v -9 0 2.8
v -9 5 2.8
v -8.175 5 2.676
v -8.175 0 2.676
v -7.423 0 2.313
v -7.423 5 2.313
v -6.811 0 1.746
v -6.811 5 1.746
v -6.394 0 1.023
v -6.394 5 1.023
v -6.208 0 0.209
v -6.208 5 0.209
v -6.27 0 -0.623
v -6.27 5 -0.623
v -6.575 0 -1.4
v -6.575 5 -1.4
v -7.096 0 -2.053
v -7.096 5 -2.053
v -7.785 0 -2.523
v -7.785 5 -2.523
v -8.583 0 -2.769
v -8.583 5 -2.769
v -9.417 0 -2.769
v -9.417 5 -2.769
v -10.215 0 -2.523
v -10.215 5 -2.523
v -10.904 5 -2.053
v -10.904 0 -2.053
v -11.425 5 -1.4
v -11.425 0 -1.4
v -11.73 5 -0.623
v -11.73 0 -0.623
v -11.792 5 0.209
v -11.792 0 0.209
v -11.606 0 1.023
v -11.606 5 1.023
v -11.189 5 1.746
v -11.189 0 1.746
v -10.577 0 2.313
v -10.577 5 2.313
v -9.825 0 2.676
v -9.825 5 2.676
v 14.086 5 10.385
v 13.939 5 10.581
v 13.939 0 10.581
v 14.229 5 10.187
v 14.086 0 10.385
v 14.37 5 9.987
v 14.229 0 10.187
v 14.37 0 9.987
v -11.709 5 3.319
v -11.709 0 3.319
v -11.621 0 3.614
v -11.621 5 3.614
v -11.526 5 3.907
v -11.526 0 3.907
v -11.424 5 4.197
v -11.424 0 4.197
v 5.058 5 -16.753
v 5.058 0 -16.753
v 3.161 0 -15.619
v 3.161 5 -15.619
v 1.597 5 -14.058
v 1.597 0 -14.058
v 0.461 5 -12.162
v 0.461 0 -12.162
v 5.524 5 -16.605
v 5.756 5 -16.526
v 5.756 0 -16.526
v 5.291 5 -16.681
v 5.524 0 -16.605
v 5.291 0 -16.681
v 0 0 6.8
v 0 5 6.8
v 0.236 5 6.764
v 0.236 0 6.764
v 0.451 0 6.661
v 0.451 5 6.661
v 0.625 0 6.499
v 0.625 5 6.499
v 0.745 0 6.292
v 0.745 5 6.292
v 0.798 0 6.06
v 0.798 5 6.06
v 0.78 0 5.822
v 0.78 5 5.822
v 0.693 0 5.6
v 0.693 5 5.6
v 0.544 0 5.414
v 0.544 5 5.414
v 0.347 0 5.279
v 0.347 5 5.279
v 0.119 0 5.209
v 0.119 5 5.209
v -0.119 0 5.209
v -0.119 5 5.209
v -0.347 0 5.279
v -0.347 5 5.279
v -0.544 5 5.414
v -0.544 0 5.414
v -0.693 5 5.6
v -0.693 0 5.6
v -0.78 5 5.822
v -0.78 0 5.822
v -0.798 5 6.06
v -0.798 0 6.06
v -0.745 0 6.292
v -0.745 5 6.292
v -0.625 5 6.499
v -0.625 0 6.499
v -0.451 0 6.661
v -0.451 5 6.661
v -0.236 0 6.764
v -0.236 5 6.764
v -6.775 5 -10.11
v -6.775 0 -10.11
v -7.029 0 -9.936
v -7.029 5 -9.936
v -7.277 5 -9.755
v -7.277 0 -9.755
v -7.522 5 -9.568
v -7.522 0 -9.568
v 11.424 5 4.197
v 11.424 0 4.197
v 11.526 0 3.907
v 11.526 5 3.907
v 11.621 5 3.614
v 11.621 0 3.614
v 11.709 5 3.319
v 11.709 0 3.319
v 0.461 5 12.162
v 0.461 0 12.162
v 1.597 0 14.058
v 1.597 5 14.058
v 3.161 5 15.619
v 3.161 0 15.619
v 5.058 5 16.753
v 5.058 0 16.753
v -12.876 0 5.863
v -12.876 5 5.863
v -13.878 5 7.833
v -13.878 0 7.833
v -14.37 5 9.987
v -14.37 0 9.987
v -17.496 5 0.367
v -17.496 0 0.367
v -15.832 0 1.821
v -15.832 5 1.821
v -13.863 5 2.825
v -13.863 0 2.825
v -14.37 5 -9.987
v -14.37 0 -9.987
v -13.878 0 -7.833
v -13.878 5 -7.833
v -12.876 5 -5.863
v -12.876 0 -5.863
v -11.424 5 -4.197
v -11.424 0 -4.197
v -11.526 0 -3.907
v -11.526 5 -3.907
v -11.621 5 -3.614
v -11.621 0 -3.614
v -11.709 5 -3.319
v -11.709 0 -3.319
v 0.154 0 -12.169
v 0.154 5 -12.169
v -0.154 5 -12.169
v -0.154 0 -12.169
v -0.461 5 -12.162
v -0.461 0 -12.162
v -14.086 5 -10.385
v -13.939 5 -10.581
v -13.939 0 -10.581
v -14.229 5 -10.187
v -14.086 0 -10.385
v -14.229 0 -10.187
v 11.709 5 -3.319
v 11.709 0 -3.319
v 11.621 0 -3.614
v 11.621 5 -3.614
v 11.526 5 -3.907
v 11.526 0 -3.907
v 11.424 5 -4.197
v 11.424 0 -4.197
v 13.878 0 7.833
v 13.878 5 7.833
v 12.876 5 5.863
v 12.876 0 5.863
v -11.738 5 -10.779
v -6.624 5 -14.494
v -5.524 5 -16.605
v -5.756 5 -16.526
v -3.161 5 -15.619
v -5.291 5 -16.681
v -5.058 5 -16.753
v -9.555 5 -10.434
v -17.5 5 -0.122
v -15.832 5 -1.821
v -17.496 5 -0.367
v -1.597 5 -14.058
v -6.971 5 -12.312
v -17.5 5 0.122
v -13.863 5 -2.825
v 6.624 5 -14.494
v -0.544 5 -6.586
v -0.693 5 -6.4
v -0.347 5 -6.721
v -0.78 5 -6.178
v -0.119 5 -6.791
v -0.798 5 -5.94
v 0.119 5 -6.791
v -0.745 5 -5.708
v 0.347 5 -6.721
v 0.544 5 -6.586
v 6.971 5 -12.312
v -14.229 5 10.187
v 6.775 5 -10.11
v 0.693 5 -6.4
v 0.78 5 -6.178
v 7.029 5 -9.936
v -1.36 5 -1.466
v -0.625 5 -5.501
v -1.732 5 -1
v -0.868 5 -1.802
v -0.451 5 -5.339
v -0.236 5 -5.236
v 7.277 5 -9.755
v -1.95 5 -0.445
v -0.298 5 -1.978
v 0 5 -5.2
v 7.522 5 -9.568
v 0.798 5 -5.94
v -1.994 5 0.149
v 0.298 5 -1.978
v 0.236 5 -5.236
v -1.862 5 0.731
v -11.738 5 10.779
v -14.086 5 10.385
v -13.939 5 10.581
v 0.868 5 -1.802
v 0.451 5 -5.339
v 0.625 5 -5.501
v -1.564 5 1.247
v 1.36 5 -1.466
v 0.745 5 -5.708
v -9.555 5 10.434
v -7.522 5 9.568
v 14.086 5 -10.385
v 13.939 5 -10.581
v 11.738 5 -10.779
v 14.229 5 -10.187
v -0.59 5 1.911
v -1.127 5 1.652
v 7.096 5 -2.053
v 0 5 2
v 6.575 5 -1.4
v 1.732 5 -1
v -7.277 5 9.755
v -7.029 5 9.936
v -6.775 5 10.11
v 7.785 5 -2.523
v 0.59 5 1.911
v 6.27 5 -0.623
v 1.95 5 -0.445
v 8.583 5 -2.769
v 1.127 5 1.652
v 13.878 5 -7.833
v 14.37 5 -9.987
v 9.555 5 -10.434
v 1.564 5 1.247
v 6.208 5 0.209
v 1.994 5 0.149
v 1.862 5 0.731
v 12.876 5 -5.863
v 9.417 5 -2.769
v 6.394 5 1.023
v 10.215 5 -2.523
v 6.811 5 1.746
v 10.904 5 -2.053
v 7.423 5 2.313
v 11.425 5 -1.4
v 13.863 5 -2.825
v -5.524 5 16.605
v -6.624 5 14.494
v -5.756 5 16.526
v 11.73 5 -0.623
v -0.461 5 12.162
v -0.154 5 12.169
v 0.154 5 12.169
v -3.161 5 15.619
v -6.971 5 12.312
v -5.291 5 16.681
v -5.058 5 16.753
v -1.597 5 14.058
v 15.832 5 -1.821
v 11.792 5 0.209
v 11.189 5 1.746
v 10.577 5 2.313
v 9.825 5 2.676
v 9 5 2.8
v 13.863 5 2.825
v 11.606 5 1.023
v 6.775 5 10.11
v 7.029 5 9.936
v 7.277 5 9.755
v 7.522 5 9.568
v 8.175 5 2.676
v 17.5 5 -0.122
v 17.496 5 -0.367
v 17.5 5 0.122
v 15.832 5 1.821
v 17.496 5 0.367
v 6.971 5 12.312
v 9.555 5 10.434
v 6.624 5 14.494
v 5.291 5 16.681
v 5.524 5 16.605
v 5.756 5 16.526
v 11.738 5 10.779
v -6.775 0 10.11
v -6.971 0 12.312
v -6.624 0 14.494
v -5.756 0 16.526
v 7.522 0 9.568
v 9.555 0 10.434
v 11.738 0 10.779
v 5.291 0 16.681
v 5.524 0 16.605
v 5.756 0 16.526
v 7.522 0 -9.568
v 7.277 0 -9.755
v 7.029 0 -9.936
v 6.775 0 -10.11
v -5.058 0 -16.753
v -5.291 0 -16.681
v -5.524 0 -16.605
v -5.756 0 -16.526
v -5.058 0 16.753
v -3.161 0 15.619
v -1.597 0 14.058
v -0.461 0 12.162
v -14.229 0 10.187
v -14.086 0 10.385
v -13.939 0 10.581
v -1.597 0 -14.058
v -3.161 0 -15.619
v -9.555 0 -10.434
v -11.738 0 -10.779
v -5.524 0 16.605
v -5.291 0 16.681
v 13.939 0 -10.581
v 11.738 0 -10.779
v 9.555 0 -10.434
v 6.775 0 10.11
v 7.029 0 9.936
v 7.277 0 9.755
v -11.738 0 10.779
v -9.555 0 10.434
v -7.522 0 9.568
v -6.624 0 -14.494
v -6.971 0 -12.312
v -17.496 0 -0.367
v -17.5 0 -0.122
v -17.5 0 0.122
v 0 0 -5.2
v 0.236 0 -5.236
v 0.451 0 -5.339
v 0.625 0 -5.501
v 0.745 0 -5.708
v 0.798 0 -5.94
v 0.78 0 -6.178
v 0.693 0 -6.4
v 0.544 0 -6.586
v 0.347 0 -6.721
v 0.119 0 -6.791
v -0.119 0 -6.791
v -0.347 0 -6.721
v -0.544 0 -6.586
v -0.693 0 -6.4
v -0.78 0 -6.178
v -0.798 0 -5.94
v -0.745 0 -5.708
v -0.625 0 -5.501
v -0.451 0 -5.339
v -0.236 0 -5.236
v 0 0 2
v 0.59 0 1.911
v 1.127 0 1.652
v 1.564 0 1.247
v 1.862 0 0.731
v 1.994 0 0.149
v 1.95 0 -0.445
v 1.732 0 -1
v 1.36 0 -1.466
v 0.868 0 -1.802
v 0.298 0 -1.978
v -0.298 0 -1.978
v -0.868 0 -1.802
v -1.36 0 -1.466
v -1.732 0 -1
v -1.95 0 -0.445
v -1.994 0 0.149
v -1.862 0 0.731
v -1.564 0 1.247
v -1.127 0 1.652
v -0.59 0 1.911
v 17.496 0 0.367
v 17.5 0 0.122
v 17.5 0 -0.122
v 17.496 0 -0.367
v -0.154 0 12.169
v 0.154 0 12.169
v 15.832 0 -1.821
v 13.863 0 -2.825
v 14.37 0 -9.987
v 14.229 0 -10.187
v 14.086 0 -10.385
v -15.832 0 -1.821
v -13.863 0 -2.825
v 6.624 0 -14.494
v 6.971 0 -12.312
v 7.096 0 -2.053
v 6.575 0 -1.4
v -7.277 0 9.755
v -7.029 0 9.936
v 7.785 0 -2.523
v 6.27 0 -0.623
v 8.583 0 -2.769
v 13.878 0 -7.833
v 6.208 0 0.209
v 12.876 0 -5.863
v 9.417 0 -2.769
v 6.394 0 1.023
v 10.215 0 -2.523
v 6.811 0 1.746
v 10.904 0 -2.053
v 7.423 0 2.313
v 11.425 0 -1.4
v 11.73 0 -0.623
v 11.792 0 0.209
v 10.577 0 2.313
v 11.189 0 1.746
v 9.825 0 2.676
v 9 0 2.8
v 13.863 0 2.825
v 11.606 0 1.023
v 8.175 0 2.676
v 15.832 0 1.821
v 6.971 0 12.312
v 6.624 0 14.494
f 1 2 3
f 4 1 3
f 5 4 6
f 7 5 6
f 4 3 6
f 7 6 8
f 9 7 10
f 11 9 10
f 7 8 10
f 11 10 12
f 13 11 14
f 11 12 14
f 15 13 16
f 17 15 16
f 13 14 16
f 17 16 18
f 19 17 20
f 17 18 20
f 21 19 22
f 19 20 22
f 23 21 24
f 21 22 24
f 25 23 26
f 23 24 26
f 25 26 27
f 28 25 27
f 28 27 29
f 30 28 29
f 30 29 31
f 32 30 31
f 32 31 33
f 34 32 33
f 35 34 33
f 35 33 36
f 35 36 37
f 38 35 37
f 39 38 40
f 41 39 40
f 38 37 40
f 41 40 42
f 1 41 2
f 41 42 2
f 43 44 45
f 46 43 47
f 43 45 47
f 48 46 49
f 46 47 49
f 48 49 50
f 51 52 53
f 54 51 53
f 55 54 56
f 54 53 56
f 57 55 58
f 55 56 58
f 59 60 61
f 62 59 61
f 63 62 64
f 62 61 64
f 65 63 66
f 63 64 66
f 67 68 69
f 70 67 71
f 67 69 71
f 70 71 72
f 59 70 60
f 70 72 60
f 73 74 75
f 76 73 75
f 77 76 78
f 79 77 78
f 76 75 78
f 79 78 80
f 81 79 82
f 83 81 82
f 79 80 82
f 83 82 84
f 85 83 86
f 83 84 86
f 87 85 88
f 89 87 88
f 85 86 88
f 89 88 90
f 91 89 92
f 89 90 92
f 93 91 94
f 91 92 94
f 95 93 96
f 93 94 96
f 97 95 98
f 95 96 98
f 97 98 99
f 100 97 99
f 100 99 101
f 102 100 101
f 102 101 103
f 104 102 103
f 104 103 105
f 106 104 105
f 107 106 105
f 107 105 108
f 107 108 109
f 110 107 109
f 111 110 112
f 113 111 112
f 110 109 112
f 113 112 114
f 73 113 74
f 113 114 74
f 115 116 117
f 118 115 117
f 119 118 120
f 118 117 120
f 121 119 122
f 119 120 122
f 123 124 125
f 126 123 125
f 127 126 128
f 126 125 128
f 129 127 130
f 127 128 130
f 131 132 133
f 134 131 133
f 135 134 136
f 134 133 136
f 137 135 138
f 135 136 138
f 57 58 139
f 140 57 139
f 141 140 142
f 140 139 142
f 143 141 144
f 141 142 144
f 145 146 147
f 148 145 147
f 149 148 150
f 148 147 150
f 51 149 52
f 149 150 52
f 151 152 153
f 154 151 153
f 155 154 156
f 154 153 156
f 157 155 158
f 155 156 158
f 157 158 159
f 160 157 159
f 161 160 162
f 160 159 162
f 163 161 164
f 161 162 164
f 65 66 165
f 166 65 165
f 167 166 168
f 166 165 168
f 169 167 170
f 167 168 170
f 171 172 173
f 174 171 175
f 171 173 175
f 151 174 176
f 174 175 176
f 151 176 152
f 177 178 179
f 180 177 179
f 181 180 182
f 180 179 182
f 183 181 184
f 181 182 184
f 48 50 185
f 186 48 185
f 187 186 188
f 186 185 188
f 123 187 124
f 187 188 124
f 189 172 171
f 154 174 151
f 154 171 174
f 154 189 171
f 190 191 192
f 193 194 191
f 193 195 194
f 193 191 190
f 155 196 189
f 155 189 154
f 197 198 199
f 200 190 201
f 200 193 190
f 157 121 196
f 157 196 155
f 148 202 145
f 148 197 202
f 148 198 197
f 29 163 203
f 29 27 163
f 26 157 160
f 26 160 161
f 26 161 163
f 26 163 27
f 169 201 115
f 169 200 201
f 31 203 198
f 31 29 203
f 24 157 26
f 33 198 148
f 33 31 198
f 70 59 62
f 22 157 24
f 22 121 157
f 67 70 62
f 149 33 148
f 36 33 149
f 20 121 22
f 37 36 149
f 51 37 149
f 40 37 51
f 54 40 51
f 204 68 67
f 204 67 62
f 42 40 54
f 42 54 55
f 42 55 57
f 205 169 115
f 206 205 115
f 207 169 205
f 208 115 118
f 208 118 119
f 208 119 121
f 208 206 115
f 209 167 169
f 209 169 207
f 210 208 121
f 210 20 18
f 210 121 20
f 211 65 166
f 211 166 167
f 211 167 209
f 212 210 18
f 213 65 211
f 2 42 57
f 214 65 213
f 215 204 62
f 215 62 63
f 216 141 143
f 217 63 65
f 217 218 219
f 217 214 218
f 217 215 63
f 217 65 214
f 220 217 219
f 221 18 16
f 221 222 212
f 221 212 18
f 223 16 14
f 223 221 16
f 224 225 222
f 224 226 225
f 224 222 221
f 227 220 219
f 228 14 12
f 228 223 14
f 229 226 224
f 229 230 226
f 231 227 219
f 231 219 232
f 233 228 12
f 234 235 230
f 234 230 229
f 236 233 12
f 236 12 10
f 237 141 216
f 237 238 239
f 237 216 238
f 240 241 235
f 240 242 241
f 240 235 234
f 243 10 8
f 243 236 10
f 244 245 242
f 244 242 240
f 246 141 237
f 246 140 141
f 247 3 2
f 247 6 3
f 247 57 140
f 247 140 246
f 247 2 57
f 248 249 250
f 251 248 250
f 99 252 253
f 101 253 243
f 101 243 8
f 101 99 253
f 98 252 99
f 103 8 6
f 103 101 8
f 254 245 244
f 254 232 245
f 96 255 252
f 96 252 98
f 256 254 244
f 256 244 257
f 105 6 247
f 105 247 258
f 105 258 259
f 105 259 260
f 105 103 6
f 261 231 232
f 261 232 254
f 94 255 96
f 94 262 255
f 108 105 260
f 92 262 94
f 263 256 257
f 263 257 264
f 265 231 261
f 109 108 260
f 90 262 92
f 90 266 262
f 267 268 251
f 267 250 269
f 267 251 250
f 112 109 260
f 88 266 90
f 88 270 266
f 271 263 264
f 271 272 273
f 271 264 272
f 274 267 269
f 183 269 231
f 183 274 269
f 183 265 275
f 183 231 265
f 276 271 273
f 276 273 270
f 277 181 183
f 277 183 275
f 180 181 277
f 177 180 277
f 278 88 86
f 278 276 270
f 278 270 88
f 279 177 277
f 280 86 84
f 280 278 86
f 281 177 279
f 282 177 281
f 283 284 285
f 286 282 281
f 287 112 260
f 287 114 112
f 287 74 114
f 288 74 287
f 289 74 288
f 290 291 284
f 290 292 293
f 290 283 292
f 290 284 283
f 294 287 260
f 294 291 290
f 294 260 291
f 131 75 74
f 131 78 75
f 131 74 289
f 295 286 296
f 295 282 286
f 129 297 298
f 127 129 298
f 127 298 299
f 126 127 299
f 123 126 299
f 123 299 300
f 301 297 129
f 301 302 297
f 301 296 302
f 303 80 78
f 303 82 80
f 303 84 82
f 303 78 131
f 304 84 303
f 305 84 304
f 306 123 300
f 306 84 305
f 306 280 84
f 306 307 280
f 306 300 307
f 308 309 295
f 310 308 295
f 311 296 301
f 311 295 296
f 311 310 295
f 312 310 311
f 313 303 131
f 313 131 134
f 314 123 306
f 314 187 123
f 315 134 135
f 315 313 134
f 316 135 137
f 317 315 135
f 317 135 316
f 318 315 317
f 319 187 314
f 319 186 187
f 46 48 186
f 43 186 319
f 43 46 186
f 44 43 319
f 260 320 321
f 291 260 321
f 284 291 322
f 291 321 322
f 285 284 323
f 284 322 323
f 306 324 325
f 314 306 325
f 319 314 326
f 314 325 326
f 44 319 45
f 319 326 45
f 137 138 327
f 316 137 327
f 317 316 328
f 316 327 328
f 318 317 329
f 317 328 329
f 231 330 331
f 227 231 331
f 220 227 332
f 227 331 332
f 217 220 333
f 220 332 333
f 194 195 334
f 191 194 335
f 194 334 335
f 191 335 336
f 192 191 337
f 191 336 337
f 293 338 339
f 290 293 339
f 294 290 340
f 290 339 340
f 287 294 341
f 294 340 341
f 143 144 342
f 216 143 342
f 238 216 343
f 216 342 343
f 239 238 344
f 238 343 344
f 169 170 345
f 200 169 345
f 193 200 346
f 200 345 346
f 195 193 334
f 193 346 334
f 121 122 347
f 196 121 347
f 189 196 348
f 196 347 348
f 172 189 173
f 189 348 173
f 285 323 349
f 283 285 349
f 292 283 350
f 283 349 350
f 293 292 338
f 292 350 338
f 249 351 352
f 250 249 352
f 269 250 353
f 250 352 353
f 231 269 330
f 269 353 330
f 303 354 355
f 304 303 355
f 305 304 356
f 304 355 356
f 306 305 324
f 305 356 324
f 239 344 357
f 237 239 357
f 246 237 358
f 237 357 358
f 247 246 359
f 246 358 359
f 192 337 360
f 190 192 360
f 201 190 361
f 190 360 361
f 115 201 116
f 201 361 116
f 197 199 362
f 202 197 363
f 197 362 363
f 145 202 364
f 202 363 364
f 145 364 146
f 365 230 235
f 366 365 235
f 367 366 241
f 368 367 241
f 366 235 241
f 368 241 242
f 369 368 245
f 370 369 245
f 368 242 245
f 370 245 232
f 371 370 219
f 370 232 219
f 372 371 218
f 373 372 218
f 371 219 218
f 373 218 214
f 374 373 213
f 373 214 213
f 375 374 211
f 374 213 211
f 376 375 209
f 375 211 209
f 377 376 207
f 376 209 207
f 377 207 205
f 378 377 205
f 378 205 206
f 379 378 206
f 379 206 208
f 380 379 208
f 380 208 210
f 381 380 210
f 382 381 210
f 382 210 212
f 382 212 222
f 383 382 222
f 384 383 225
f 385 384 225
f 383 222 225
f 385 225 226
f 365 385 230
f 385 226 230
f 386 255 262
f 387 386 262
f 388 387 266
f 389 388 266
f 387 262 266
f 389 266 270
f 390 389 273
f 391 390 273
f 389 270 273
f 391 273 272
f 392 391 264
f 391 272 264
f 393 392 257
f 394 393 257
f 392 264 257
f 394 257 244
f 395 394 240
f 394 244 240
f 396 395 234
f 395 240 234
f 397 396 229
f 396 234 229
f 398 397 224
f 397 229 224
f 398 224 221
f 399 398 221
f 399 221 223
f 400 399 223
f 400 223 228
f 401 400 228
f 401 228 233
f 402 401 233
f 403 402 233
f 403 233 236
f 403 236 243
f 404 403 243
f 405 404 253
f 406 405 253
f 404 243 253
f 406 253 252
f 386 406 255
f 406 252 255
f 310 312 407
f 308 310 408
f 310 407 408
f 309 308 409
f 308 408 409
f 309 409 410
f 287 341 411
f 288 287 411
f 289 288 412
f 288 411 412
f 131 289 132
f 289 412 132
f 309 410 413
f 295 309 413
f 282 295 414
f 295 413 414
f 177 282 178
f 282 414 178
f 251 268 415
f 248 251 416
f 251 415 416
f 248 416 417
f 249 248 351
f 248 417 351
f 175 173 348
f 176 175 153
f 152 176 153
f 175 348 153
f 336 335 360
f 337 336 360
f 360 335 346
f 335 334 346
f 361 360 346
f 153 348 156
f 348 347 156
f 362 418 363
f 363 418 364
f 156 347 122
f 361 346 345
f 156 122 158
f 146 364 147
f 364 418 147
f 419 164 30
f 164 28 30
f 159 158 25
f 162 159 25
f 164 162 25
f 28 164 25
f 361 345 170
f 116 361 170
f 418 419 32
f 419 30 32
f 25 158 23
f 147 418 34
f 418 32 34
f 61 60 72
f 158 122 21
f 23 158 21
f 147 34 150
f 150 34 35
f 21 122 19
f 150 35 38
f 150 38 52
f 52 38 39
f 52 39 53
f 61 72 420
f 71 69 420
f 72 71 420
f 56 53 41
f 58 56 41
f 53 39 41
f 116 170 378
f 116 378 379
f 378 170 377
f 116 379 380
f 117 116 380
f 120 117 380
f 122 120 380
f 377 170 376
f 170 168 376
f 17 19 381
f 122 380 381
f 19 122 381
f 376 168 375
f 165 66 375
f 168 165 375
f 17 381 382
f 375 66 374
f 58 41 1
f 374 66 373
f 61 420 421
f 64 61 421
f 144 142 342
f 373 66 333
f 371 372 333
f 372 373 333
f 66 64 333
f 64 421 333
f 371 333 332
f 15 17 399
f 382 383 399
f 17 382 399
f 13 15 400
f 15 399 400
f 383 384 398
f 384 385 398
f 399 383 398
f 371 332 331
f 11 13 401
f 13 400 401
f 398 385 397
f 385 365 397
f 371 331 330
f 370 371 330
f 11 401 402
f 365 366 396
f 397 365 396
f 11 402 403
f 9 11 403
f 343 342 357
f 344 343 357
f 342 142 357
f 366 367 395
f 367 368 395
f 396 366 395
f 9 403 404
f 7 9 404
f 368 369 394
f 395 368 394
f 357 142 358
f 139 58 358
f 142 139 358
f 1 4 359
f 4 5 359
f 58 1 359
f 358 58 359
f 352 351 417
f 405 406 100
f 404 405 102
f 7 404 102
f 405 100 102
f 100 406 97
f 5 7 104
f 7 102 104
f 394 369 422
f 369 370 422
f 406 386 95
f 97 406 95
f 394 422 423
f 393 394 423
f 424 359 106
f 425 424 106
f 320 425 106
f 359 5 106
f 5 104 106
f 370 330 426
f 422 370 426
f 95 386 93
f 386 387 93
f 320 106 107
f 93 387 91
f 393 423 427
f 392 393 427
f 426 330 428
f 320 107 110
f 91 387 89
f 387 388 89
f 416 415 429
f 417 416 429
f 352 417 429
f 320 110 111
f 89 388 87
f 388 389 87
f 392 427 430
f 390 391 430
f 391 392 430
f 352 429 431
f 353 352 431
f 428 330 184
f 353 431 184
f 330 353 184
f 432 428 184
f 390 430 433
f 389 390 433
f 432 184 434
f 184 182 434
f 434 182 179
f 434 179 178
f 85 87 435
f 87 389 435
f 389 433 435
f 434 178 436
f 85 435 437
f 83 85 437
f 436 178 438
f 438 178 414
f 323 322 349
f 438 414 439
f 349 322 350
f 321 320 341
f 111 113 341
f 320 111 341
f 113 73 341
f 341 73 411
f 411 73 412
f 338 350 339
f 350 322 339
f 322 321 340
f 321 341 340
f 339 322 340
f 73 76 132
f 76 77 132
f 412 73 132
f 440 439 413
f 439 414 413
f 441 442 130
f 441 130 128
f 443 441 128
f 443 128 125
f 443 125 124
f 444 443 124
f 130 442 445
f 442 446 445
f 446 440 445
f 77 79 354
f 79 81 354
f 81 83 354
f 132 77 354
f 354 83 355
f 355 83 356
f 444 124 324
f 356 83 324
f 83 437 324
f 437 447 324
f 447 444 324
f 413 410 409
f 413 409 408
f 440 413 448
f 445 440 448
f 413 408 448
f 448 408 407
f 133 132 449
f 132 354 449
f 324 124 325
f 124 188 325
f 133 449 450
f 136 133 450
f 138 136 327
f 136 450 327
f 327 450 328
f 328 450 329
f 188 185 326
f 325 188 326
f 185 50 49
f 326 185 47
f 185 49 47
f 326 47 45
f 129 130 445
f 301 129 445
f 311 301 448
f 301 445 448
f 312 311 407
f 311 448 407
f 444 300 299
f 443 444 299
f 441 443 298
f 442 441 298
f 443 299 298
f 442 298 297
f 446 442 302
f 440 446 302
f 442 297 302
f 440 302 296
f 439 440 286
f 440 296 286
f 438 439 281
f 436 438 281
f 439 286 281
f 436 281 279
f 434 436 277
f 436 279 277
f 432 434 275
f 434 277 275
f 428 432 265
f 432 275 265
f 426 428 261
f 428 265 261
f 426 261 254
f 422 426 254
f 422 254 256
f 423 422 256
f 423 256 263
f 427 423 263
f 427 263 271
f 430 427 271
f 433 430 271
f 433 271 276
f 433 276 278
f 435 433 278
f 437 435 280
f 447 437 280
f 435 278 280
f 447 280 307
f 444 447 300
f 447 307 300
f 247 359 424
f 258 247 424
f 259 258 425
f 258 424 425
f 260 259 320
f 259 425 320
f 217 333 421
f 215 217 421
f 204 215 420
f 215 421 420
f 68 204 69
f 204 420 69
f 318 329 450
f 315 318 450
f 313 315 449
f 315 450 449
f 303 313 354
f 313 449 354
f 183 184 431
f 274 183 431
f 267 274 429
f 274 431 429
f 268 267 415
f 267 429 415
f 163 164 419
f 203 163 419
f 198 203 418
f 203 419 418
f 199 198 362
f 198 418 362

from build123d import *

# Parameters (mm, degrees)
SKETCH1_R           = 17.5
BOSS_EXTRUDE1_DEPTH = 5
CUT_EXTRUDE1_START  = -5
CUT_EXTRUDE1_DEPTH  = 5
CIRPATTERN1_COUNT   = 10
SKETCH3_R           = 2
CUT_EXTRUDE2_DEPTH  = 5
SKETCH4_R           = 0.8
SKETCH4_R_2         = 2.8
CUT_EXTRUDE3_DEPTH  = 5


with BuildPart() as part:
    # Sketch1 → Boss-Extrude1 (new body)
    with BuildSketch(Plane(origin=(0, 0, 0), x_dir=(1, 0, 0), z_dir=(0, 1, 0))):
        with Locations(Location((0, 0, 0), (0, 0, 270))):
            Circle(SKETCH1_R)
    extrude(amount=BOSS_EXTRUDE1_DEPTH)

    # Sketch2 → Cut-Extrude1 (cut)
    with BuildSketch(Plane(origin=(0, 5, 0), x_dir=(1, 0, 0), z_dir=(0, 1, 0)).offset(CUT_EXTRUDE1_START)):
        with BuildLine():
            ThreePointArc((-0.461351562, 12.161707059), (-2.330748839, 14.886662879), (-5.057656399, 16.753211983))
            ThreePointArc((-5.057656399, 16.753211983), (0, 17.5), (5.057656399, 16.753211983))
            ThreePointArc((5.057656399, 16.753211983), (2.330748839, 14.886662879), (0.461351562, 12.161707059))
            ThreePointArc((0.461351562, 12.161707059), (0, 12.170454545), (-0.461351562, 12.161707059))
        make_face()
    cut_extrude1 = extrude(amount=CUT_EXTRUDE1_DEPTH, mode=Mode.SUBTRACT)

    # CirPattern1: Cut-Extrude1 ×10 about axis
    cirpattern1_axis = Axis((0, 0, 0), (0, 1, 0))
    for i in range(1, CIRPATTERN1_COUNT):
        add(cut_extrude1.rotate(cirpattern1_axis, i * 360 / CIRPATTERN1_COUNT), mode=Mode.SUBTRACT)

    # Sketch3 → Cut-Extrude2 (cut)
    with BuildSketch(Plane(origin=(0, 5, 0), x_dir=(1, 0, 0), z_dir=(0, 1, 0))):
        with Locations(Location((0, 0, 0), (0, 0, 270))):
            Circle(SKETCH3_R)
    extrude(amount=-CUT_EXTRUDE2_DEPTH, mode=Mode.SUBTRACT)

    # Sketch4 → Cut-Extrude3 (cut)
    with BuildSketch(Plane(origin=(0, 5, 0), x_dir=(1, 0, 0), z_dir=(0, 1, 0))):
        with Locations(Location((0, 6, 0), (0, 0, 270))):
            Circle(SKETCH4_R)
        with Locations(Location((0, -6, 0), (0, 0, 270))):
            Circle(SKETCH4_R)
        with Locations(Location((-9, 0, 0), (0, 0, 270))):
            Circle(SKETCH4_R_2)
        with Locations(Location((9, 0, 0), (0, 0, 270))):
            Circle(SKETCH4_R_2)
    extrude(amount=-CUT_EXTRUDE3_DEPTH, mode=Mode.SUBTRACT)


solid = part.part
